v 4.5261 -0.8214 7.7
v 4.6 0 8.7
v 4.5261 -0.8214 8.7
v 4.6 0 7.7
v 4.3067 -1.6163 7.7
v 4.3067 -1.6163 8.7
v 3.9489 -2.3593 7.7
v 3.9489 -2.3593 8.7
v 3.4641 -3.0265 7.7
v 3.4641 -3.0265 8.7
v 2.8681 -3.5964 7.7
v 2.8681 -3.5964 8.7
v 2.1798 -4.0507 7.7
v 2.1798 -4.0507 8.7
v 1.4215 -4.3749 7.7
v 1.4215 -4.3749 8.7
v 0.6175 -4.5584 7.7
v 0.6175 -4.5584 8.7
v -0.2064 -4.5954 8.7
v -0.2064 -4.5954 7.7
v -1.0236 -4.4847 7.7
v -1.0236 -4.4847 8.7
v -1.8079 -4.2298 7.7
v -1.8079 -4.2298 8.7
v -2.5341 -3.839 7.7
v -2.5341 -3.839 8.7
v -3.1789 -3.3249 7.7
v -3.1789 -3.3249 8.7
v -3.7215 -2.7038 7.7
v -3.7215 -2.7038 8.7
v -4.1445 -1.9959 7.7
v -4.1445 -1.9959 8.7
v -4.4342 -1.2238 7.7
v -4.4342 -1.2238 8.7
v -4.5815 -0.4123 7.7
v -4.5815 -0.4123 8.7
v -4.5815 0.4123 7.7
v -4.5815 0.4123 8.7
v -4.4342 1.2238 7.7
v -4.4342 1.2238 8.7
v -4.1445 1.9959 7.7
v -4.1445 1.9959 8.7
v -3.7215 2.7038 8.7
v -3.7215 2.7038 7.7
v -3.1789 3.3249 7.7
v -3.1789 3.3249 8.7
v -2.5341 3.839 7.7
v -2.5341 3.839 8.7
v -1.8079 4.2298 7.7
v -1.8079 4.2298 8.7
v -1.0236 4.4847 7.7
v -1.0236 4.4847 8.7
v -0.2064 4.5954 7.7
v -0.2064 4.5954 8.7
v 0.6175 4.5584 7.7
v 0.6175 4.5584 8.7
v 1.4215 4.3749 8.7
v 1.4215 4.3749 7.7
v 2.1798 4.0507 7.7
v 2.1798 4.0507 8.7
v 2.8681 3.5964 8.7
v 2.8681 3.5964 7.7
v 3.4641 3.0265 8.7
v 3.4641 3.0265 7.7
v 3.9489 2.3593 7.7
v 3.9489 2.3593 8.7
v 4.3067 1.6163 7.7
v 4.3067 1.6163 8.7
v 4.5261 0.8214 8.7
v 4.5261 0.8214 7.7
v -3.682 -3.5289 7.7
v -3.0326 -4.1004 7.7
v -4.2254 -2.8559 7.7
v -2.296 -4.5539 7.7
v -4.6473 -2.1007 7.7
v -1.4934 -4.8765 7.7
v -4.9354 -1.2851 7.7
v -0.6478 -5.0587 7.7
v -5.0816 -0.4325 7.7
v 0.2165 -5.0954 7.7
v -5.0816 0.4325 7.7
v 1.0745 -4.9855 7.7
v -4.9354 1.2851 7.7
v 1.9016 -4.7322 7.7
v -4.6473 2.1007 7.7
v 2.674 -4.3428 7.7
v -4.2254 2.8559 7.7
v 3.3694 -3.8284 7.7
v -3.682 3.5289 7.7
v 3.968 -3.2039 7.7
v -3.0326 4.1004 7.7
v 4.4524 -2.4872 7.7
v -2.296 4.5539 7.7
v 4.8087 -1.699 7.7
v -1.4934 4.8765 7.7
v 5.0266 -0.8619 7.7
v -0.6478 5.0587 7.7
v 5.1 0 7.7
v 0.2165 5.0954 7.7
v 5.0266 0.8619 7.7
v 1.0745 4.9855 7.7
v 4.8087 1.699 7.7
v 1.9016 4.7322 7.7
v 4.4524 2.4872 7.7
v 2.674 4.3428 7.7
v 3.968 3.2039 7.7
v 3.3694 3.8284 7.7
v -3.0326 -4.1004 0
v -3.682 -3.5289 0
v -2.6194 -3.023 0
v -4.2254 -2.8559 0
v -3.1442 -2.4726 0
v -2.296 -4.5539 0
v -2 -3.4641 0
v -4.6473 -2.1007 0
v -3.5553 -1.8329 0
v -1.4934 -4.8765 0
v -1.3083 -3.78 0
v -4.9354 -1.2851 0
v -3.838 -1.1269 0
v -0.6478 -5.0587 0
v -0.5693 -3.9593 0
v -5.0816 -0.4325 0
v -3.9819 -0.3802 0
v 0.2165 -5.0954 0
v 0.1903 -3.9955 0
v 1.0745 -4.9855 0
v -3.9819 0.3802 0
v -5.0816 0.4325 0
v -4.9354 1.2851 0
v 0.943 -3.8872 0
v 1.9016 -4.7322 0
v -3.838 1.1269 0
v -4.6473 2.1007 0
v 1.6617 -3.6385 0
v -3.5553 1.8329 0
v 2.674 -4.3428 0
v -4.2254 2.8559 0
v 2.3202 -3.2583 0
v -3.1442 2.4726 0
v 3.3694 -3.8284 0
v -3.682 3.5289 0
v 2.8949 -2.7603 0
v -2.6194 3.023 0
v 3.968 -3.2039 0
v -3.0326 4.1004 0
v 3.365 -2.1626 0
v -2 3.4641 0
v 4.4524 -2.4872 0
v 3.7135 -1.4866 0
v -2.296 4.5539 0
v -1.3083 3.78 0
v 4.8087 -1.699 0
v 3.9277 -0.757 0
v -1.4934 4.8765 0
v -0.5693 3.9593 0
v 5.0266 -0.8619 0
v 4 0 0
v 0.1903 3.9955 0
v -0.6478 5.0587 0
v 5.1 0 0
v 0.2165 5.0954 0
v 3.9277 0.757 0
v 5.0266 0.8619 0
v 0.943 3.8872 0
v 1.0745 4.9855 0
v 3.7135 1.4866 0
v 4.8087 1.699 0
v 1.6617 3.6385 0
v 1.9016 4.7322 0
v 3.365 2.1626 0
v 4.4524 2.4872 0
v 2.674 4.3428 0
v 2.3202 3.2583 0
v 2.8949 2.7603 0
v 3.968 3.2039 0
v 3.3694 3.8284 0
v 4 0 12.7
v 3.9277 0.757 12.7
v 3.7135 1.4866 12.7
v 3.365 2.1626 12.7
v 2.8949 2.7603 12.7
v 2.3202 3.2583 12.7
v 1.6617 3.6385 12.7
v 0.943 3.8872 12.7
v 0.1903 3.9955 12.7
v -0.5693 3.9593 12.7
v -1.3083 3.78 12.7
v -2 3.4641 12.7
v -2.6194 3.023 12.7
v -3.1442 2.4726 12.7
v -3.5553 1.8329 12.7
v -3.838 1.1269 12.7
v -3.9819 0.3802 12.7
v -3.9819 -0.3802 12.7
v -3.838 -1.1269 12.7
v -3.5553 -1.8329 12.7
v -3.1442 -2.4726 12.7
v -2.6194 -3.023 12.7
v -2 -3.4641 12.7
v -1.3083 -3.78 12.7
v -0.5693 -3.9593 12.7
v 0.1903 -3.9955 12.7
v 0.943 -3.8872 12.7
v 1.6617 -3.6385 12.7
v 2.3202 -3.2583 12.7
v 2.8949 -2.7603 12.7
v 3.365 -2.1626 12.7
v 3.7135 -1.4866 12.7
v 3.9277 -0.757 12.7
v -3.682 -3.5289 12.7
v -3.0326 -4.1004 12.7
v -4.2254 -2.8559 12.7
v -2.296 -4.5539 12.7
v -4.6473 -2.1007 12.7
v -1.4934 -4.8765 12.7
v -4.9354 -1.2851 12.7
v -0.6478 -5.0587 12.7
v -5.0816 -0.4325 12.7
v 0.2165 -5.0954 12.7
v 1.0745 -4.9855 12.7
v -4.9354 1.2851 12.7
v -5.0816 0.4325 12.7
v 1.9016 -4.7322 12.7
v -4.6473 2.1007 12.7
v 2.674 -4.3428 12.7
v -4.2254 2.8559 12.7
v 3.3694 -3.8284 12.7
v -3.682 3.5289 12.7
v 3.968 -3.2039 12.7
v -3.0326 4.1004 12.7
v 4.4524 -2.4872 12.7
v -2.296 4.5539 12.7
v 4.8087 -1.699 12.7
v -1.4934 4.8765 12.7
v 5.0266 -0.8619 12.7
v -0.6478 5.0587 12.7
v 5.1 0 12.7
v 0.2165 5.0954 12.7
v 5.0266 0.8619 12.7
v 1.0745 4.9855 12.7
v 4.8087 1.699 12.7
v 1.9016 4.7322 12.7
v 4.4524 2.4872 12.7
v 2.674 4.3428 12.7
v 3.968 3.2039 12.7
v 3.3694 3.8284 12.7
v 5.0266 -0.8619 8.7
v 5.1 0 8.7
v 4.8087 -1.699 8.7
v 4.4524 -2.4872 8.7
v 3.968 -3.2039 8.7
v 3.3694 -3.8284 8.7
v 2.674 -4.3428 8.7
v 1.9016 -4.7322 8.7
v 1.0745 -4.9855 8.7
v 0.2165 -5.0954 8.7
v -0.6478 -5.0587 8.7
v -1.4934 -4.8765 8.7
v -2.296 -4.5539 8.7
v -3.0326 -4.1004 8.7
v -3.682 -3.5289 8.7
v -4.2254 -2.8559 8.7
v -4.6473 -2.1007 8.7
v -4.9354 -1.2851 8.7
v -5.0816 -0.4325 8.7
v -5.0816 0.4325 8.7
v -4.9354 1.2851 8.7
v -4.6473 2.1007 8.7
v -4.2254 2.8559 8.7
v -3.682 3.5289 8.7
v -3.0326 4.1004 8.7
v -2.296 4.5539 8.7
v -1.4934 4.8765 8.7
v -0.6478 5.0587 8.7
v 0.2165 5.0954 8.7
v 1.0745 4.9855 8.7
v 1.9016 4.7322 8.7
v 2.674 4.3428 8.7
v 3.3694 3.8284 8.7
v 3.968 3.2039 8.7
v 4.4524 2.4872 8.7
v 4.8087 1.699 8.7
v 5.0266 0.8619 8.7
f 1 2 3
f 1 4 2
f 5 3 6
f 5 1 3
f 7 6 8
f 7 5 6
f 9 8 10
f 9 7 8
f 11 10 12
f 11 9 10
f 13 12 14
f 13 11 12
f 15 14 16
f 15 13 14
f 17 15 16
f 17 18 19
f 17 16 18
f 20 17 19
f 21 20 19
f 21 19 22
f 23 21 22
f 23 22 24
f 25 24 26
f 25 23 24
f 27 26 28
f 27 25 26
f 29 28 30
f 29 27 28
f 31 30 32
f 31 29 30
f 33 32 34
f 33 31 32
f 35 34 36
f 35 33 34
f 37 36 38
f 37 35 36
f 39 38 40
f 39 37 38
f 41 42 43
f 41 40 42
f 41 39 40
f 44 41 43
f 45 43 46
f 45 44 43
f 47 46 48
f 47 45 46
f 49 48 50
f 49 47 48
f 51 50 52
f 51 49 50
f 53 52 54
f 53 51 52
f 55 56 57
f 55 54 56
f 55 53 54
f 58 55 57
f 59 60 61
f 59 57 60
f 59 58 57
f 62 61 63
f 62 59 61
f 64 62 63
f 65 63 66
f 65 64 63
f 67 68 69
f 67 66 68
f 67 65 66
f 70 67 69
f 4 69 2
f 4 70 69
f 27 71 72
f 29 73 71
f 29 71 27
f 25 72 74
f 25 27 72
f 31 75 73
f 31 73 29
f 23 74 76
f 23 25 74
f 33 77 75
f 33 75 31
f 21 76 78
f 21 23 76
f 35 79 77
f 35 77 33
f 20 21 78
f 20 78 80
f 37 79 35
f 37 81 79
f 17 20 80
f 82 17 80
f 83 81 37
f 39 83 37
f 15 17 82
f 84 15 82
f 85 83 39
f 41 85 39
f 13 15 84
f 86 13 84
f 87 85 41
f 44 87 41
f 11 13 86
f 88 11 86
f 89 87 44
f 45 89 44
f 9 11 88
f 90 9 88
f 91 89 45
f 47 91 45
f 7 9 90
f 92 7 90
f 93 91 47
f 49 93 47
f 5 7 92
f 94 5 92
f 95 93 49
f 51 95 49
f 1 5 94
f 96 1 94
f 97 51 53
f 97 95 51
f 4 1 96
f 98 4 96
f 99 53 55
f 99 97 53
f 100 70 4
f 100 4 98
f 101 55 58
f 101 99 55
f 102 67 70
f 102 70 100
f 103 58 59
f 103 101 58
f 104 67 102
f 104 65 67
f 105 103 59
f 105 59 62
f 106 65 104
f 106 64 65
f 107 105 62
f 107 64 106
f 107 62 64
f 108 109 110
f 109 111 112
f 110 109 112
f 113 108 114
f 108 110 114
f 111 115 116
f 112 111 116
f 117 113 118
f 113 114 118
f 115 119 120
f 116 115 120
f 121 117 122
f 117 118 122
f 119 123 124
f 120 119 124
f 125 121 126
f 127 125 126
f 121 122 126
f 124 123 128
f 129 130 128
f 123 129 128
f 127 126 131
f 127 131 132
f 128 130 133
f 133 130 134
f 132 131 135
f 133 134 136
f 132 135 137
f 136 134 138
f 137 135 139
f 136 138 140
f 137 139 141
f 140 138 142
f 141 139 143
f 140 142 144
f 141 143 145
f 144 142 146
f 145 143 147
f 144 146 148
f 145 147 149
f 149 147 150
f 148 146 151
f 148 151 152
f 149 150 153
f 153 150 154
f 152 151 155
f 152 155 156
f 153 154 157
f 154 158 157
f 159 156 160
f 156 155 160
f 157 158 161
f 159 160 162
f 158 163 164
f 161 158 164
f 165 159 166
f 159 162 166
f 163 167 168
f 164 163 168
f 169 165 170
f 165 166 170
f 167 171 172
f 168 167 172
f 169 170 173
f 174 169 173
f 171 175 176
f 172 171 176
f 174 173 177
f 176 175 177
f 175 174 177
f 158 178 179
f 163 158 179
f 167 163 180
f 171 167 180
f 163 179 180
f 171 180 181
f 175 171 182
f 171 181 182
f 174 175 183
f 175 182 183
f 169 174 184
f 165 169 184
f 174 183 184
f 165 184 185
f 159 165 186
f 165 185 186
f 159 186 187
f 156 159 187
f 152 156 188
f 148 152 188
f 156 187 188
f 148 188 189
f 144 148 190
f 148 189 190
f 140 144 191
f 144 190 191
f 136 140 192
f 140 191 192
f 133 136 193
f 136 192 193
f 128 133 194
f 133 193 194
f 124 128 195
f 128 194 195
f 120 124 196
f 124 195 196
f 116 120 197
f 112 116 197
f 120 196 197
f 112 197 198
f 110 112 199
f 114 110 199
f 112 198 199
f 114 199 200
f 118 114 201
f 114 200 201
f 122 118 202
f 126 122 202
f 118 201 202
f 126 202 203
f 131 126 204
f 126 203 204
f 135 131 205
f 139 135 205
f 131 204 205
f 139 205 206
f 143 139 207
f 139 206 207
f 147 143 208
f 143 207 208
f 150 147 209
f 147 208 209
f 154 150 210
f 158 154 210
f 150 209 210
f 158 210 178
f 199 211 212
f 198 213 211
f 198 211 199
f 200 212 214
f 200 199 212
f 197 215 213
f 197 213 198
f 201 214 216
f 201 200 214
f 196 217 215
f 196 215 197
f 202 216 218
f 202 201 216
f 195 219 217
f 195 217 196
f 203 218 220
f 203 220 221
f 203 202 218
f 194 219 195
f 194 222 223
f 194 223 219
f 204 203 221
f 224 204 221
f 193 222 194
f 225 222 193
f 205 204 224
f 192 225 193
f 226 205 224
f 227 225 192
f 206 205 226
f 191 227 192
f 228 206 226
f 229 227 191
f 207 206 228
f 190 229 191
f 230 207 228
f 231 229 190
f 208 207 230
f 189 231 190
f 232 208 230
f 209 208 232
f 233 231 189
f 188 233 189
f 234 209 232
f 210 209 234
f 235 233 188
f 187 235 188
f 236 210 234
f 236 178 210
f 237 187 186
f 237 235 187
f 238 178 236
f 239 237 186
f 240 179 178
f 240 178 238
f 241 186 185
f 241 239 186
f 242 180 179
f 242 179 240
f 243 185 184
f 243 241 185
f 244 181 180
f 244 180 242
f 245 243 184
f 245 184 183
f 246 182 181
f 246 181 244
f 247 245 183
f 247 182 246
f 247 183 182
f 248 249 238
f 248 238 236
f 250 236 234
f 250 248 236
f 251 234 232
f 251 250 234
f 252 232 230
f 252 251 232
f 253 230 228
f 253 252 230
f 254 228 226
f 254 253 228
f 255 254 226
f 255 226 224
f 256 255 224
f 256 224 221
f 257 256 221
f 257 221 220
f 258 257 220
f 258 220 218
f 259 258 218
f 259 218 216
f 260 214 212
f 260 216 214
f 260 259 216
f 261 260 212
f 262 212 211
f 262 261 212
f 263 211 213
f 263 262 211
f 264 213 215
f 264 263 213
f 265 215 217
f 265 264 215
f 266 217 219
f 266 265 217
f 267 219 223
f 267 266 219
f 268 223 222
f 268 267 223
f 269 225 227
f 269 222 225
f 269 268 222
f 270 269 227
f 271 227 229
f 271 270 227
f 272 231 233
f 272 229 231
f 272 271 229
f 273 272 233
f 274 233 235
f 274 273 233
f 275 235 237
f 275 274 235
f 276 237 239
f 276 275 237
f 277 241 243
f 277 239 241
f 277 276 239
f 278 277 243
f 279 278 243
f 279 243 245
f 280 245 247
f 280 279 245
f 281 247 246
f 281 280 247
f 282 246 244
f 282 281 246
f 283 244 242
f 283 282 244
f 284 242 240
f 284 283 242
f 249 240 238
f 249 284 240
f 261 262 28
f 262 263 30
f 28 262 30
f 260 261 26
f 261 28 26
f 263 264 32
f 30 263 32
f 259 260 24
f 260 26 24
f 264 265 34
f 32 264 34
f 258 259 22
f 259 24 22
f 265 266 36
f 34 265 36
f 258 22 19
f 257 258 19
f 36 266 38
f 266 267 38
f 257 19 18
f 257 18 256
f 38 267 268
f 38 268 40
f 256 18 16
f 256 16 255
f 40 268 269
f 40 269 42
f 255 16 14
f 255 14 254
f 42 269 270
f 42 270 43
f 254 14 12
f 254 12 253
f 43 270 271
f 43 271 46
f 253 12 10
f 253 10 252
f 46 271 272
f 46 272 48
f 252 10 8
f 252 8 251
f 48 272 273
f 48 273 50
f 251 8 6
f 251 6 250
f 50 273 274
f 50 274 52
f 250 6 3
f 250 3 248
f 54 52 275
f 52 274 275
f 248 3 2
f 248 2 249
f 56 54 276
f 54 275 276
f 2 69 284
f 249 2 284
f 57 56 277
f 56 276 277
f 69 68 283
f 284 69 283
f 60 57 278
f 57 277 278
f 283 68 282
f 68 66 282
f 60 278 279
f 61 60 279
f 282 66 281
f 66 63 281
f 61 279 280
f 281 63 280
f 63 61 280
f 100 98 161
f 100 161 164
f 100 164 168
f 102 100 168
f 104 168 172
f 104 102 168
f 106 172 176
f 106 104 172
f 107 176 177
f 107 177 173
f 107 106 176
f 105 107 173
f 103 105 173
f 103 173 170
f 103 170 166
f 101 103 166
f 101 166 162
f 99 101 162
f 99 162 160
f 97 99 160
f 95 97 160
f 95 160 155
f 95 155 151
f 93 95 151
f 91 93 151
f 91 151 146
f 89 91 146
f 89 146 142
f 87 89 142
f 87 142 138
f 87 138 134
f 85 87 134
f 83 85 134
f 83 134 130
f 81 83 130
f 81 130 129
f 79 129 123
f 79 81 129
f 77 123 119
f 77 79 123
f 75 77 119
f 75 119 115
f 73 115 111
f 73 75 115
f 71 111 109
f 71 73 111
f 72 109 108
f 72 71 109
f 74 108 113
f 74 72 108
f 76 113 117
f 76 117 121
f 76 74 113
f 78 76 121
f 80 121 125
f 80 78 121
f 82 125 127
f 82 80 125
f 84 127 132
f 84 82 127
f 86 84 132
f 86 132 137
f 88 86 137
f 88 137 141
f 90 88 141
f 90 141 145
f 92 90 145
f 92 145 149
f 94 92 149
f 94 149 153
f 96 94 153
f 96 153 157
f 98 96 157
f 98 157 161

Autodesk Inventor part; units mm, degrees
ref_plane "YZ Plane" through (0, 0, 0) normal (1, 0, 0) x (0, 1, 0)
ref_plane "XZ Plane" through (0, 0, 0) normal (0, 1, 0) x (-1, 0, 0)
ref_plane "XY Plane" through (0, 0, 0) normal (0, 0, 1) x (1, 0, 0)
sketch "Sketch1" plane through (0, 0, 0) normal (0, 1, 0) x (-1, 0, 0)
  line L0 (-4, 0) -> (-4, 12.7)
  line L1 (-4, 12.7) -> (-5.1, 12.7)
  line L2 (-4, 0) -> (-5.1, 0)
  line L3 (-5.1, 12.7) -> (-5.1, 8.7)
  line L4 (-5.1, 8.7) -> (-4.6, 8.7)
  line L5 (-4.6, 8.7) -> (-4.6, 7.7)
  line L6 (-4.6, 7.7) -> (-5.1, 7.7)
  line L7 (-5.1, 0) -> (-5.1, 7.7)
  line L8 (-5.1, 8.7) -> (-5.1, 12.7)
  line L9 (0, -2.54) -> (0, 15.24) projected
  point P0 (0, 0)
  dimension "d0" = 5.1
  dimension "d1" = 12.7
  dimension "d2" = 4
  dimension "d3" = 4
  dimension "d4" = 0.5
  dimension "d5" = 1
revolve "Revolution1" add sketch "Sketch1" angle 360 about axis through (0, 0, -10) along (0, 0, 1)
thread "Thread1" size "M8x1.25" class "6H" standard "ANSI Metric M Profile" length 26.04
properties part number "M8-HEATINSERT"
